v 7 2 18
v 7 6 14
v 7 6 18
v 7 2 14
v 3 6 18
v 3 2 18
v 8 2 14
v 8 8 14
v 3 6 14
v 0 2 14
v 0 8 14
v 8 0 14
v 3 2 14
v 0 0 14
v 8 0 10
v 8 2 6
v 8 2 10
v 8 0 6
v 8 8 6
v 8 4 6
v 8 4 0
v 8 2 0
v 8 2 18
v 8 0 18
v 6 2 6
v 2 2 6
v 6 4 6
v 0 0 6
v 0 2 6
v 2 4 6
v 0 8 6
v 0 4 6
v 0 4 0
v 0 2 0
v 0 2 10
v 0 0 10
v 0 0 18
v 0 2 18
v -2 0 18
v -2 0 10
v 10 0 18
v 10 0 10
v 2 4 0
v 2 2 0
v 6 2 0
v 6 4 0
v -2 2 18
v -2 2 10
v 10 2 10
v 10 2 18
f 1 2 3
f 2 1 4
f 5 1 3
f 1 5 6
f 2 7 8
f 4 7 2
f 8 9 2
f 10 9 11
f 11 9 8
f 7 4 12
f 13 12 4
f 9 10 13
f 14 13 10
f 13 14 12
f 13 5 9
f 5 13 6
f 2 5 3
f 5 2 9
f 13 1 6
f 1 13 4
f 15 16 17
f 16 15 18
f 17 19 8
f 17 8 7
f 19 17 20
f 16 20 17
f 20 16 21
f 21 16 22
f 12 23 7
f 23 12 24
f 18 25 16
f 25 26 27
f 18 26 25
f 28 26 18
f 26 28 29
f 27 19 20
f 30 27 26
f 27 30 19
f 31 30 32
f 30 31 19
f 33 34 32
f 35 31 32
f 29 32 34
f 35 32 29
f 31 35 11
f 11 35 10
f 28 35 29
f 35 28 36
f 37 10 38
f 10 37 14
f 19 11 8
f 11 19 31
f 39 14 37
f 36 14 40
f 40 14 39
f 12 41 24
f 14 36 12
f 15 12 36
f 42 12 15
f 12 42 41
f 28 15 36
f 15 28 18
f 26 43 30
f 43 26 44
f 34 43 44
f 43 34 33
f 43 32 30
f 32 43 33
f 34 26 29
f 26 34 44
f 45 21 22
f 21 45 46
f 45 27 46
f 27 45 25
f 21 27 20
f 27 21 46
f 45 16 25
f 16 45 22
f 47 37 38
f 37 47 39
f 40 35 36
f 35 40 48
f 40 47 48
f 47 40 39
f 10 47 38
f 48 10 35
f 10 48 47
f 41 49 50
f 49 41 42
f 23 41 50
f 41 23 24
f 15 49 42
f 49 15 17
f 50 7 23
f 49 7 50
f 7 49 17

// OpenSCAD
// file: ../../../shapes/minecraft/copper-golem/copper-golem.scad
module copperGolem(headRotation_z = 0,
                    rightArmRotation_x = 0)
{
    // Head
    translate([2, 2, 14])
    {
rotate ([0, 0, $t*360])

translate ([1, 0])

rotate ([0, 0, -$t*360])        
//        rotate([0, 0, headRotation_z])
        color("orange")
        cube([4, 4, 4], center=false);
//        cube([4, 4, 4], center=true);
    }

    // Body
    translate([0, 0, 6])
    {
        color("green")
        cube([8, 8, 8]);
    }

    // Legs
    translate([0, 2, 0])
    {
        color("pink")
        cube([2, 2, 8]);
    }

    translate([6, 2, 0])
    {
        color("pink")
        cube([2, 2, 8]);
    }

    // Arms
    translate([-2, 0, 10])
    {
        // left arm
        color("red")
        cube([2, 2, 8]);
    }

    translate([8, 0, 10])
    {
        // right arm
        color("red")
        rotate([rightArmRotation_x, 0, 0])
        cube([2, 2, 8]);
    }

    // Eyes
    translate([2, 2, 8])
    {
        color("white")
        cube([2, 2, 2]);
    }

    translate([4, 2, 8])
    {
        color("white")
        cube([2, 2, 2]);
    }
}
// main file
use <../../../shapes/minecraft/copper-golem/copper-golem.scad>

// rotate ([0, 0, $t*360])

//translate ([10, 0])

// square(5, center=true);
copperGolem(headRotation_z = $t*360,
            rightArmRotation_x = $t*360);



// animation settings:
//    FPS: 20
//    Steps: 100
